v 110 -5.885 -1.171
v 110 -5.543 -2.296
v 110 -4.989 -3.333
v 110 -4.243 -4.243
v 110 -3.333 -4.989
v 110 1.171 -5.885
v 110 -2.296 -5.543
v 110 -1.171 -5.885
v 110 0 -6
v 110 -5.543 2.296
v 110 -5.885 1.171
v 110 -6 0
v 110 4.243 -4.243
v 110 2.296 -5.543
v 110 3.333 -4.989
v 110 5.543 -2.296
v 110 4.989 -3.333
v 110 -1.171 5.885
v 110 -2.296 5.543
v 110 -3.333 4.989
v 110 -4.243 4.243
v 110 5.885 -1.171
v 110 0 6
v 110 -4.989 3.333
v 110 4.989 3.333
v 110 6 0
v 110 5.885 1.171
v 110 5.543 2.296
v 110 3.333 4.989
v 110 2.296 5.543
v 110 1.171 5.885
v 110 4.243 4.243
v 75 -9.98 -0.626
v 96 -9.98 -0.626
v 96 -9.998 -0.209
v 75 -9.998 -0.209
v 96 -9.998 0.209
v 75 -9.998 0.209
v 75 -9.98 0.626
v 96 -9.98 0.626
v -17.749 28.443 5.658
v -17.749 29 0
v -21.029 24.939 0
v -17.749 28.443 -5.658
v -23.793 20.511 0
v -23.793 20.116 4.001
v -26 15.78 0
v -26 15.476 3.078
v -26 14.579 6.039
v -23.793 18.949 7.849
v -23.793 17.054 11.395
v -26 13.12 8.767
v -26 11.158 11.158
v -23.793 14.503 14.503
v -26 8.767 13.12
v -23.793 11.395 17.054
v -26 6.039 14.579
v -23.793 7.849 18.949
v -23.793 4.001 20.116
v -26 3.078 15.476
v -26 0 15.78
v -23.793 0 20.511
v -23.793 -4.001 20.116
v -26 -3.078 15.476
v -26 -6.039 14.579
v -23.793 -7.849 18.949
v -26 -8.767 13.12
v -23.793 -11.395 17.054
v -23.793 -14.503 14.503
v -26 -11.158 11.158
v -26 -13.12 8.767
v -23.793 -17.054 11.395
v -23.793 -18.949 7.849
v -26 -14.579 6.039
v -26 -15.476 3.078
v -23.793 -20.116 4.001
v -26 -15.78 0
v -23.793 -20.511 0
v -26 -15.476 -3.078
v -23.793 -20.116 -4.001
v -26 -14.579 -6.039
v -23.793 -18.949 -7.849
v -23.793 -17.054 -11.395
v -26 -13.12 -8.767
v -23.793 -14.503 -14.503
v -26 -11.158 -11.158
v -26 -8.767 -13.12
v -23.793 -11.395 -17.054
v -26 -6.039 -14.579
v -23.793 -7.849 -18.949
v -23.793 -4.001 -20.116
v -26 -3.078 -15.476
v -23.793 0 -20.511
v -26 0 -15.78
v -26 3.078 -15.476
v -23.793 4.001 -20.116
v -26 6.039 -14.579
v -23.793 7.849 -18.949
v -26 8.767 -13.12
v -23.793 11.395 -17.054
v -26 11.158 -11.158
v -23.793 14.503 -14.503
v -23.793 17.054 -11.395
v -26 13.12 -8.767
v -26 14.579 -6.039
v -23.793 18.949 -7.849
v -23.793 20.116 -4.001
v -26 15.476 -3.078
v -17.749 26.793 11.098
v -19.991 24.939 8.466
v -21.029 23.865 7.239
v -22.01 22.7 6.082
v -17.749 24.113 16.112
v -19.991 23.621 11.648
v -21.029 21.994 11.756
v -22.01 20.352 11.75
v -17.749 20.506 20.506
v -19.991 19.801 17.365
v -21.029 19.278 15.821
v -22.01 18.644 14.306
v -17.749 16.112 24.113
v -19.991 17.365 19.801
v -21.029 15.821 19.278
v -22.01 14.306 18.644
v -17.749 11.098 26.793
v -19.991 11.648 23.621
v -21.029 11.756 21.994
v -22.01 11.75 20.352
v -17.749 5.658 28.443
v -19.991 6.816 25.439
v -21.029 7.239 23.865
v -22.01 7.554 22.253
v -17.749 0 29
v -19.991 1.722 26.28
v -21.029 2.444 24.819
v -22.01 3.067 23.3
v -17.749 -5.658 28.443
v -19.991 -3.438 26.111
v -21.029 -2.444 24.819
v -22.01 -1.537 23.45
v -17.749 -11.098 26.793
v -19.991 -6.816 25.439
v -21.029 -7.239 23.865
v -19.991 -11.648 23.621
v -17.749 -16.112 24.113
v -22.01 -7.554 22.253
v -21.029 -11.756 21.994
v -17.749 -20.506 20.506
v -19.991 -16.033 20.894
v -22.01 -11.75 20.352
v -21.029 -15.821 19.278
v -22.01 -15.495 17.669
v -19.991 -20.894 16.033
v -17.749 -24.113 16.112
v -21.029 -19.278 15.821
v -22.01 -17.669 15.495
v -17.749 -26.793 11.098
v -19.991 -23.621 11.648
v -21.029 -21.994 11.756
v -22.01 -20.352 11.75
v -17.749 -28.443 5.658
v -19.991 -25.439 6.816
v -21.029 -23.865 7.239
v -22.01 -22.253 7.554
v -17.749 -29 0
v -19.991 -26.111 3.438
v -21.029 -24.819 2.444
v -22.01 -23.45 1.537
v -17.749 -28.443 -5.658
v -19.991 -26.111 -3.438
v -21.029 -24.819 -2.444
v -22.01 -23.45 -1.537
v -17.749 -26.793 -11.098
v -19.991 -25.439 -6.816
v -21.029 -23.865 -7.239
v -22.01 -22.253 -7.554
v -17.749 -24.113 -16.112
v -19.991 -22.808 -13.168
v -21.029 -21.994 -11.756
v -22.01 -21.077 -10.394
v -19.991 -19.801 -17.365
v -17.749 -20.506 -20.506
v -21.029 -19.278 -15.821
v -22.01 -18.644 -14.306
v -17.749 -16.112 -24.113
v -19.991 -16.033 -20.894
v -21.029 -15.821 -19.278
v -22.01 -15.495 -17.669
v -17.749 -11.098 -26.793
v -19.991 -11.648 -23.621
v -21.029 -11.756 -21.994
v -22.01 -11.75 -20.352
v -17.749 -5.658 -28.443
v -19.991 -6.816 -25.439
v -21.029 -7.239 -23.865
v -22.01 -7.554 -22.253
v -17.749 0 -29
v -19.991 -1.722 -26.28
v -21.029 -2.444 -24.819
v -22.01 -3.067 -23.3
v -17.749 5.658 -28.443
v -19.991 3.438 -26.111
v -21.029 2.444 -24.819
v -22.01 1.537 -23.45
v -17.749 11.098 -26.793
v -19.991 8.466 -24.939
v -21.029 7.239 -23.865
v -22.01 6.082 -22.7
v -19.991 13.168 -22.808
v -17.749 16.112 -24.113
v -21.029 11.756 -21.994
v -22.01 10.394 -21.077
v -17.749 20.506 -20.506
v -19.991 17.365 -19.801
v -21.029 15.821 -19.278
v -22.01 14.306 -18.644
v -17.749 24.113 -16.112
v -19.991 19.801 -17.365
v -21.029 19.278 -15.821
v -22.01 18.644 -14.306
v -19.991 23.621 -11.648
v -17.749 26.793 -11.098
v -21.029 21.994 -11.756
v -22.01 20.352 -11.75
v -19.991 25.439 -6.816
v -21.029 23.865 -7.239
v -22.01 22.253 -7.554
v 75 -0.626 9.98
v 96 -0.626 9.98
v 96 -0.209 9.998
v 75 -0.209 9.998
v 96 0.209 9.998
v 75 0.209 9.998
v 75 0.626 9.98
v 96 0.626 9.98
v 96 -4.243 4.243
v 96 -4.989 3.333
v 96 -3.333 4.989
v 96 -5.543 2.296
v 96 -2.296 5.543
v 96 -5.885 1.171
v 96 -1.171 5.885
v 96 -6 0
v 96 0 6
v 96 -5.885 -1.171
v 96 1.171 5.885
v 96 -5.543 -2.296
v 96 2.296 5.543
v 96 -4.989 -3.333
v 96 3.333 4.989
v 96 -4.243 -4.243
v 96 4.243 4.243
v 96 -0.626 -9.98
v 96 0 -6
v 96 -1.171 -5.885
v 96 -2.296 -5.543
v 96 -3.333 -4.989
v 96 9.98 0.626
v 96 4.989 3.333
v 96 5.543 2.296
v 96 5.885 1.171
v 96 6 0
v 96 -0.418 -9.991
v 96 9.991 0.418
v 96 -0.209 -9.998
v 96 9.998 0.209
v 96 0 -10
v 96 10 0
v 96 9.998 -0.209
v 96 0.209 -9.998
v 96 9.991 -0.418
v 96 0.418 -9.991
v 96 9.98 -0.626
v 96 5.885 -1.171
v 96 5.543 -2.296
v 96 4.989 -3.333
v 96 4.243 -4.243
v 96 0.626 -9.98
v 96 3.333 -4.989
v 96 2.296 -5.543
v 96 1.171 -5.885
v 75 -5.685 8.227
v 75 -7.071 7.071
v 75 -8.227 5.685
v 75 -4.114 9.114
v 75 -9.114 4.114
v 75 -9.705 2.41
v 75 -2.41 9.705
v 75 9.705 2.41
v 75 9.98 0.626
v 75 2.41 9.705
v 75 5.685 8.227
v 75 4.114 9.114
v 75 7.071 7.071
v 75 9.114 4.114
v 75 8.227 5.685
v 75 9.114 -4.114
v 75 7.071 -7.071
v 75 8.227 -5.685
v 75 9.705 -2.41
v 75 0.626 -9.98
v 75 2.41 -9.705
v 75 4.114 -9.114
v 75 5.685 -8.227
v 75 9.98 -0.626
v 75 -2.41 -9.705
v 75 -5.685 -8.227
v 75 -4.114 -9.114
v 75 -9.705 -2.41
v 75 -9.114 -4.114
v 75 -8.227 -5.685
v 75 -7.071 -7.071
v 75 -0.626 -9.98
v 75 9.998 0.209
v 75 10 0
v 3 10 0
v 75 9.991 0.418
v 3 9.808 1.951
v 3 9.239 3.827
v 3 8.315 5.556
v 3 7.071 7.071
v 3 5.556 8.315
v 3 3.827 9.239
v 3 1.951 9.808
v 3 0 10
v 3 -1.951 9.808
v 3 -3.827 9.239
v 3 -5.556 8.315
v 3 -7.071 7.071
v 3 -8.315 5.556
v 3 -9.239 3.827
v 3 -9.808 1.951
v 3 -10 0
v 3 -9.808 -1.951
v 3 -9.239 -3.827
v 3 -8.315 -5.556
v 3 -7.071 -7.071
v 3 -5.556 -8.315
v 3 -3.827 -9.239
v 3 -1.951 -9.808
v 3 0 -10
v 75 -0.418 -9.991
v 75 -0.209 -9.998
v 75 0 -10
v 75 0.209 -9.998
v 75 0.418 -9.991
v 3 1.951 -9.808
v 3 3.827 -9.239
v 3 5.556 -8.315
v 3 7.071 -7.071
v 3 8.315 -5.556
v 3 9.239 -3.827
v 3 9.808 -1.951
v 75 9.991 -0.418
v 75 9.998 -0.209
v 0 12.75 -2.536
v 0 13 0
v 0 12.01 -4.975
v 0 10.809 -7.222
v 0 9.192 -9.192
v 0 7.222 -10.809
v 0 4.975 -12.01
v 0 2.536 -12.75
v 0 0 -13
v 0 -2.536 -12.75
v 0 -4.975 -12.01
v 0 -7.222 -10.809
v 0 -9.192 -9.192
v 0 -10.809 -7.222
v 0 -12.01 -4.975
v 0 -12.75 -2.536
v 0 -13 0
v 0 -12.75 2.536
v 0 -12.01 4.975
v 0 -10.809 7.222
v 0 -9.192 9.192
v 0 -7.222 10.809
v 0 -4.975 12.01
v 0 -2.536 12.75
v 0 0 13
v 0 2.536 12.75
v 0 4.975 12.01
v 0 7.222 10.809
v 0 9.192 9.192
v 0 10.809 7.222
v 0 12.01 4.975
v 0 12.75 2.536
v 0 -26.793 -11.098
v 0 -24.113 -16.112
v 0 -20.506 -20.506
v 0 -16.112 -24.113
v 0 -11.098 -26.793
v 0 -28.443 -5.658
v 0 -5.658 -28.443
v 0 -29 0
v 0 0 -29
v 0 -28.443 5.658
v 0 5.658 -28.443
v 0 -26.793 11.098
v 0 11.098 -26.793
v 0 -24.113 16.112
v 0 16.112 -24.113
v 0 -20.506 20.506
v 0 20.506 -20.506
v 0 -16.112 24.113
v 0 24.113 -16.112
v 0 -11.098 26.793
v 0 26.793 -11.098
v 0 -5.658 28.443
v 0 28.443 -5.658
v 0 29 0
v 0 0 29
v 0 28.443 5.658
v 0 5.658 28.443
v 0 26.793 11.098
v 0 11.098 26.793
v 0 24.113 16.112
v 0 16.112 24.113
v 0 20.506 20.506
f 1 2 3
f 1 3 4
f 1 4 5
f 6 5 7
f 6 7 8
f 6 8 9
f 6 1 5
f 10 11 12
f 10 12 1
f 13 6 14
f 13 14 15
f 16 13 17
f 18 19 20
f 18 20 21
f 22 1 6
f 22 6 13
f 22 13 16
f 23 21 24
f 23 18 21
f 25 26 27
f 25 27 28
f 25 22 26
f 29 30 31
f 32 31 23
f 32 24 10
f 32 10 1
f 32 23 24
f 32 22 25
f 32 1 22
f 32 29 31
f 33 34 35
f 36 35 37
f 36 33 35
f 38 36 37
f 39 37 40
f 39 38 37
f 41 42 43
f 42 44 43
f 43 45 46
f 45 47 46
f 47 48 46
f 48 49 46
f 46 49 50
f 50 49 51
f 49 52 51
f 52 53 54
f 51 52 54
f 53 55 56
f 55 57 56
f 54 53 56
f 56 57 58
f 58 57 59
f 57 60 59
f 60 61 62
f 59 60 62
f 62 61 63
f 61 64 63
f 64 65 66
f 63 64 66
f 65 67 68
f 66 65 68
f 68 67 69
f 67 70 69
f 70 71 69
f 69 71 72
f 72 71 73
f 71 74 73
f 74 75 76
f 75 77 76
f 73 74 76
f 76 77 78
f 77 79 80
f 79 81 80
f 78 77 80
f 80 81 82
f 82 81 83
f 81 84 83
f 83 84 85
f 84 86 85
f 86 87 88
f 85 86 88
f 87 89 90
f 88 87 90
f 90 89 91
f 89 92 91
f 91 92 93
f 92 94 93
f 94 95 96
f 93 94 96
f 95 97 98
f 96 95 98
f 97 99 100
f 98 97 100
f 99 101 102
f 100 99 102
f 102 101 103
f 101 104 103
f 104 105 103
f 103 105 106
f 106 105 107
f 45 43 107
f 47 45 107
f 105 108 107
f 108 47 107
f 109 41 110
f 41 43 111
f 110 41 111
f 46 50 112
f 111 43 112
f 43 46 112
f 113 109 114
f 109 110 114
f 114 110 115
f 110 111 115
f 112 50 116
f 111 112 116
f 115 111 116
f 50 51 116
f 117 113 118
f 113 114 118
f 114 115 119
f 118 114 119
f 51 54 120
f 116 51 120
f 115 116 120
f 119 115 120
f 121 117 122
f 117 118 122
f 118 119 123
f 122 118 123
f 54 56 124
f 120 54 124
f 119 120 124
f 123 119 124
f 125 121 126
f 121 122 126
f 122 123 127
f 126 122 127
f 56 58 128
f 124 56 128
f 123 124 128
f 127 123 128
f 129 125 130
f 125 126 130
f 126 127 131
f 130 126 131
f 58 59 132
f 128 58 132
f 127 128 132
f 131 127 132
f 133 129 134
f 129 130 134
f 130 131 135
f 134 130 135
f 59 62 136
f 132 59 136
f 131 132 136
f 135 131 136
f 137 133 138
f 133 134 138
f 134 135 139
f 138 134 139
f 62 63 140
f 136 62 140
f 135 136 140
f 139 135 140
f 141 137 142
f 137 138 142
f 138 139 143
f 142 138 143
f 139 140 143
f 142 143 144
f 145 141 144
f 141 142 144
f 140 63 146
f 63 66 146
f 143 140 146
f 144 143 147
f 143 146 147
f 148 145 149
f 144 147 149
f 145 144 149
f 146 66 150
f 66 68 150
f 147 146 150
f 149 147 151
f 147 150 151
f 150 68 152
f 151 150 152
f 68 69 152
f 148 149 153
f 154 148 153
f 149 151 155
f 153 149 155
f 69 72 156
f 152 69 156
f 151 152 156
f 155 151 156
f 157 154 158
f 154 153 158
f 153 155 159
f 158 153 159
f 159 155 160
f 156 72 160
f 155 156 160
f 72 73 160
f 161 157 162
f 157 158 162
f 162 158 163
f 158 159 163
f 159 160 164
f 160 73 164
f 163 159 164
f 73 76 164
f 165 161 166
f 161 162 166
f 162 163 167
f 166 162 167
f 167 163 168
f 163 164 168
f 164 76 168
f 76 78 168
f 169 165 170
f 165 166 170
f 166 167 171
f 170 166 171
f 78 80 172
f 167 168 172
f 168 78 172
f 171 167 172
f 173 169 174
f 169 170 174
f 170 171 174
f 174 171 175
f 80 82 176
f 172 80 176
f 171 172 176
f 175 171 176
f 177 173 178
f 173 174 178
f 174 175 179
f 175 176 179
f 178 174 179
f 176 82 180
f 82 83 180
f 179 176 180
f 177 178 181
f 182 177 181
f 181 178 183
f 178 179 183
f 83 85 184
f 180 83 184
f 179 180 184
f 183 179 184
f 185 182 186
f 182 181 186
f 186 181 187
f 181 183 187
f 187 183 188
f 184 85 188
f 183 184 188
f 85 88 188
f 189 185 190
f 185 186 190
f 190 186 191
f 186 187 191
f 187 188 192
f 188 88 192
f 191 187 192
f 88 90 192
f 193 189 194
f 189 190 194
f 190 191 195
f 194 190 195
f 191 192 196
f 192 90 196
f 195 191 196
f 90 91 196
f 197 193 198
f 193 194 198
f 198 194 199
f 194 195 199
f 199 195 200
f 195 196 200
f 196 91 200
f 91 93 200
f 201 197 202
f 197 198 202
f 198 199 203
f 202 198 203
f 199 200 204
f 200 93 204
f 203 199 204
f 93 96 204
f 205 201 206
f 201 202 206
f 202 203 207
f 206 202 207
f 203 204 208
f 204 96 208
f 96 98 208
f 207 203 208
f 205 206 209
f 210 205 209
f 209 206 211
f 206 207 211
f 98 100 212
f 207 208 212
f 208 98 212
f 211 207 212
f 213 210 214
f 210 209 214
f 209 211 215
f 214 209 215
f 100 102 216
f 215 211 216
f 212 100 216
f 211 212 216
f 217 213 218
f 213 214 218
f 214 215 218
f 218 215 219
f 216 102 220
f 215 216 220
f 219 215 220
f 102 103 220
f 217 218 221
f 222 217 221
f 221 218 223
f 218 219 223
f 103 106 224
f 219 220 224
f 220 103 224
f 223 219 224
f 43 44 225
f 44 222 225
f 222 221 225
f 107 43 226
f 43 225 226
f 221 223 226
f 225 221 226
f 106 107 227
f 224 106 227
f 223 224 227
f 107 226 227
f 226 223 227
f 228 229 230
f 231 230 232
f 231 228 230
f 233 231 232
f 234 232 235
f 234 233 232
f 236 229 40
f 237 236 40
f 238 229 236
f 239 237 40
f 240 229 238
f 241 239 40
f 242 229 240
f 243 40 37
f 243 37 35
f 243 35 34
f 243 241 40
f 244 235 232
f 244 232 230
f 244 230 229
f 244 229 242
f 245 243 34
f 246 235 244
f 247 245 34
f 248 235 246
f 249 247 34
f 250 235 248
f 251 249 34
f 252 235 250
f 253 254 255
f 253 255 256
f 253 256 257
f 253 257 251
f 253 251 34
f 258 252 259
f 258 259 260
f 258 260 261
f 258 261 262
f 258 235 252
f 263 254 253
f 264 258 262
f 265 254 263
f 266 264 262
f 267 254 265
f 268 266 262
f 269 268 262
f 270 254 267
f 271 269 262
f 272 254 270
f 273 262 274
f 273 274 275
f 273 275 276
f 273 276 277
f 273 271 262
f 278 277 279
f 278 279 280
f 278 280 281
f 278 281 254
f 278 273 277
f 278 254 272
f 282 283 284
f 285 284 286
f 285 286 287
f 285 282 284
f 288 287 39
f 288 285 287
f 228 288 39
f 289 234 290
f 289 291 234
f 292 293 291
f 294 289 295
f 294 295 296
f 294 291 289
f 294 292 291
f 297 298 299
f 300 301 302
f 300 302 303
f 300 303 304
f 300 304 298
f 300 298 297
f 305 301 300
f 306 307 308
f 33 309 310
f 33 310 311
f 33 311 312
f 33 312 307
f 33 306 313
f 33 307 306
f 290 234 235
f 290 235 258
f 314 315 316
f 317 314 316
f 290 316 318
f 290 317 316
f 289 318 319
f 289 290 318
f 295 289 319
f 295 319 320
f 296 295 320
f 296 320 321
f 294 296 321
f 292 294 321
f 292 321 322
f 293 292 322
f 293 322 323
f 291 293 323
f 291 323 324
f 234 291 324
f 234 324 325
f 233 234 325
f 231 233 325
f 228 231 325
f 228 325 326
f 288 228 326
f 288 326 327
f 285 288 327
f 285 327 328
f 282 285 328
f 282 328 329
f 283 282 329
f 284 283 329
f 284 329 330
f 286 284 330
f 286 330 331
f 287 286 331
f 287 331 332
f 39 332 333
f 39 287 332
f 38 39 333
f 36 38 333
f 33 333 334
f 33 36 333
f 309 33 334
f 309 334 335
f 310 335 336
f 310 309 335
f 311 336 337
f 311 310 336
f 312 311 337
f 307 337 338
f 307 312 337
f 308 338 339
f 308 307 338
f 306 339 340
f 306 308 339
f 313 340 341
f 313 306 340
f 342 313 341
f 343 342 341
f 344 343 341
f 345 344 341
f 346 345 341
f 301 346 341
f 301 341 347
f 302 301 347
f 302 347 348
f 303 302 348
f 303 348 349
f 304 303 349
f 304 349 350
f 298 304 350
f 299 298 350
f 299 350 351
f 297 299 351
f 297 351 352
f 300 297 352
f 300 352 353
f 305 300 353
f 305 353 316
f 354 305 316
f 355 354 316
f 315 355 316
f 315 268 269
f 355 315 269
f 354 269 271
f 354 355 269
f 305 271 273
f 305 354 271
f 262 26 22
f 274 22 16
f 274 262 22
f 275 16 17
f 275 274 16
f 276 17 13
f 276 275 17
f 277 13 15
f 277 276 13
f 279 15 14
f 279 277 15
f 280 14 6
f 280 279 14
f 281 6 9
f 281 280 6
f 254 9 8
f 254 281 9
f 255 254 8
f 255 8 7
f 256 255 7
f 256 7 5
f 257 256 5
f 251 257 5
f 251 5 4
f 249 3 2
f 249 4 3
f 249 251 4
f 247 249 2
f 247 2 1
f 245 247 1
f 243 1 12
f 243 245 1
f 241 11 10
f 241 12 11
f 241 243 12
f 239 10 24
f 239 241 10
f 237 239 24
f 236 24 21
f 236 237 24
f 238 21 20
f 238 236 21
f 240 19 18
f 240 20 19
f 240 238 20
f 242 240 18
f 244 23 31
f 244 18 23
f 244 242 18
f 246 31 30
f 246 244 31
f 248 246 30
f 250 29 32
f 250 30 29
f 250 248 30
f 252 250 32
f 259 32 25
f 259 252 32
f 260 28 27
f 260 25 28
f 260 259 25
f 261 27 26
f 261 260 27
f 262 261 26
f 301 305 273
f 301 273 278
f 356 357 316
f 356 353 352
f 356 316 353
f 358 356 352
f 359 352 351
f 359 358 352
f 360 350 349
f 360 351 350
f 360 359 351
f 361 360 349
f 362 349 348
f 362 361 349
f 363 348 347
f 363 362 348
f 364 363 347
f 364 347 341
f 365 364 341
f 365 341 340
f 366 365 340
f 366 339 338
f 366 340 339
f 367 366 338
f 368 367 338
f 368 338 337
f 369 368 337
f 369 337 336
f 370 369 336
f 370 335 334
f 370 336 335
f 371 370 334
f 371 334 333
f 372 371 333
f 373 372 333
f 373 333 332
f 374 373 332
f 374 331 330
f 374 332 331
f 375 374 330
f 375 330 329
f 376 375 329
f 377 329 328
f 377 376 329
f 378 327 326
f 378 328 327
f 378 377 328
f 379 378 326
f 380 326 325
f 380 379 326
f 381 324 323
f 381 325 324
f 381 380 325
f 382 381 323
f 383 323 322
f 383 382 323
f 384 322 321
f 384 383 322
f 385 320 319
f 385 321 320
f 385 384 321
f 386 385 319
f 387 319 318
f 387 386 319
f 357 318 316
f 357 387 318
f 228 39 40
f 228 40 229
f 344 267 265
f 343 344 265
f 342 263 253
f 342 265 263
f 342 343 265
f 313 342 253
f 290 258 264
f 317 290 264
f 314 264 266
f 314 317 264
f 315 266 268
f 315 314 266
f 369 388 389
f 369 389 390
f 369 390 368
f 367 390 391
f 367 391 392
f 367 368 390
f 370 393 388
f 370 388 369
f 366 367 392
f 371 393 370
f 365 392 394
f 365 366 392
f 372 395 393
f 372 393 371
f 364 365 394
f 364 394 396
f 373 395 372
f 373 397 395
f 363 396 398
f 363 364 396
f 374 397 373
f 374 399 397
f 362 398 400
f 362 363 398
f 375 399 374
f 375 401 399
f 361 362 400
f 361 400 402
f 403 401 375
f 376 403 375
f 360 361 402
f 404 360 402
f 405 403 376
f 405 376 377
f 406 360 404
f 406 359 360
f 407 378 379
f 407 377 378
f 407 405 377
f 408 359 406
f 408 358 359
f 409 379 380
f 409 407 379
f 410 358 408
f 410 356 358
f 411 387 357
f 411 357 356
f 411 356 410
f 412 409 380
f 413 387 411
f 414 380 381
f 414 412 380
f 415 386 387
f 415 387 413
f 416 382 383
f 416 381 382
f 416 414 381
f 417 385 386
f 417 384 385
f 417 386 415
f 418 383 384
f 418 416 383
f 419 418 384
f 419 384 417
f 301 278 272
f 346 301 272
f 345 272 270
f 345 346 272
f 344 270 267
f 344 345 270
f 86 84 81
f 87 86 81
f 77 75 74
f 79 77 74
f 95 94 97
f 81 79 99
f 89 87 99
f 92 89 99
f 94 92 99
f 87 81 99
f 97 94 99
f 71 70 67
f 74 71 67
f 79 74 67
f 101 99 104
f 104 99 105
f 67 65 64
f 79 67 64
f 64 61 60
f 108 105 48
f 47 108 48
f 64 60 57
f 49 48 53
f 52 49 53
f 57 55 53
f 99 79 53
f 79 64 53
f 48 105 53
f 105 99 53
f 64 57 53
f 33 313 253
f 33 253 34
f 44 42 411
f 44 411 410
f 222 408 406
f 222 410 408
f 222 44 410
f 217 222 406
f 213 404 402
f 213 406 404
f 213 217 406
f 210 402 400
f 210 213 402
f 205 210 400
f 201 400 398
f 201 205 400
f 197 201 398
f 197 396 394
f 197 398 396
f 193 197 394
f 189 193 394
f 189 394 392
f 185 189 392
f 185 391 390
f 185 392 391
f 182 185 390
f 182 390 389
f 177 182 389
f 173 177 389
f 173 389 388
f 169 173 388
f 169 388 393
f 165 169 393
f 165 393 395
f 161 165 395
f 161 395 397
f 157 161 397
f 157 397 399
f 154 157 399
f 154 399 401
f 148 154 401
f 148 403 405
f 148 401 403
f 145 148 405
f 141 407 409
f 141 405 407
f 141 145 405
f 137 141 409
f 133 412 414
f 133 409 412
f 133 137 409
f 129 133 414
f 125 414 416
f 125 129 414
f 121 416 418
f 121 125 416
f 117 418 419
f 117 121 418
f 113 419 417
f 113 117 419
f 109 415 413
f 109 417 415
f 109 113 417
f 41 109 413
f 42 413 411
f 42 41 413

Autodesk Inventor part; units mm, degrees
ref_plane "YZ Plane" through (0, 0, 0) normal (1, 0, 0) x (0, 1, 0)
ref_plane "XZ Plane" through (0, 0, 0) normal (0, 1, 0) x (-1, 0, 0)
ref_plane "XY Plane" through (0, 0, 0) normal (0, 0, 1) x (1, 0, 0)
sketch "草图1" plane through (0, 0, 0) normal (0, 0, 1) x (1, 0, 0)
  line L0 (0, 29) -> (0, 10)
  line L1 (0, 10) -> (75, 10)
  line L2 (0, 0) -> (110, 0)
  line L3 (110, 0) -> (110, 6)
  line L4 (110, 6) -> (75, 6)
  line L5 (75, 6) -> (75, 10)
  arc A0 (-17.749, 29) -> (-26, 15.7797) centre (14, 0) ccw
  line L6 (0, 29) -> (-17.749, 29)
  line L7 (0, 0) -> (-29, 0)
  line L8 (-26, 15.7797) -> (-26, 0)
  dimension "d0" = 110
  dimension "d1" = 10
  dimension "d2" = 6
  dimension "d4" = 86
  dimension "d5" = 29
  dimension "d8" = 35
  dimension "d14" = 26
  dimension "d15" = 14
revolve "旋转1" add sketch "草图1" angle 360 about axis through (0, 0, 0) along (1, 0, 0)
sketch "草图2" plane through (75, 0, 0) normal (1, 0, 0) x (0, 0, -1)
  circle A0 centre (0, 0) radius 29 projected
  line L0 (0, 10.6066) -> (10.6066, 0)
  line L1 (10.6066, 0) -> (0, -10.6066)
  line L2 (0, -10.6066) -> (-10.6066, 0)
  line L3 (-10.6066, 0) -> (0, 10.6066)
  line L4 (0, 0) -> (0, 10)
  circle A1 centre (0, 0) radius 10 projected
  point P0 (0.6262, 9.9804)
  point P1 (-0.6262, 9.9804)
  point P2 (-9.9804, 0.6262)
  point P3 (-9.9804, -0.6262)
  point P4 (-0.6262, -9.9804)
  point P5 (0.6262, -9.9804)
  point P6 (9.9804, -0.6262)
  point P7 (9.9804, 0.6262)
  dimension "d9" = 7.5
extrude "拉伸1" add sketch "草图2" along normal blind 21 contours L0 A1 L1 L2 L3
thread "螺纹1" size "M12x1.75" designation "M12" class "6g" standard "GB Metric profile" full length
chamfer "倒角1" distance 3 angle 45 1 edges at (0, -10, 0)
properties part number "塞杆" material "不锈钢"
